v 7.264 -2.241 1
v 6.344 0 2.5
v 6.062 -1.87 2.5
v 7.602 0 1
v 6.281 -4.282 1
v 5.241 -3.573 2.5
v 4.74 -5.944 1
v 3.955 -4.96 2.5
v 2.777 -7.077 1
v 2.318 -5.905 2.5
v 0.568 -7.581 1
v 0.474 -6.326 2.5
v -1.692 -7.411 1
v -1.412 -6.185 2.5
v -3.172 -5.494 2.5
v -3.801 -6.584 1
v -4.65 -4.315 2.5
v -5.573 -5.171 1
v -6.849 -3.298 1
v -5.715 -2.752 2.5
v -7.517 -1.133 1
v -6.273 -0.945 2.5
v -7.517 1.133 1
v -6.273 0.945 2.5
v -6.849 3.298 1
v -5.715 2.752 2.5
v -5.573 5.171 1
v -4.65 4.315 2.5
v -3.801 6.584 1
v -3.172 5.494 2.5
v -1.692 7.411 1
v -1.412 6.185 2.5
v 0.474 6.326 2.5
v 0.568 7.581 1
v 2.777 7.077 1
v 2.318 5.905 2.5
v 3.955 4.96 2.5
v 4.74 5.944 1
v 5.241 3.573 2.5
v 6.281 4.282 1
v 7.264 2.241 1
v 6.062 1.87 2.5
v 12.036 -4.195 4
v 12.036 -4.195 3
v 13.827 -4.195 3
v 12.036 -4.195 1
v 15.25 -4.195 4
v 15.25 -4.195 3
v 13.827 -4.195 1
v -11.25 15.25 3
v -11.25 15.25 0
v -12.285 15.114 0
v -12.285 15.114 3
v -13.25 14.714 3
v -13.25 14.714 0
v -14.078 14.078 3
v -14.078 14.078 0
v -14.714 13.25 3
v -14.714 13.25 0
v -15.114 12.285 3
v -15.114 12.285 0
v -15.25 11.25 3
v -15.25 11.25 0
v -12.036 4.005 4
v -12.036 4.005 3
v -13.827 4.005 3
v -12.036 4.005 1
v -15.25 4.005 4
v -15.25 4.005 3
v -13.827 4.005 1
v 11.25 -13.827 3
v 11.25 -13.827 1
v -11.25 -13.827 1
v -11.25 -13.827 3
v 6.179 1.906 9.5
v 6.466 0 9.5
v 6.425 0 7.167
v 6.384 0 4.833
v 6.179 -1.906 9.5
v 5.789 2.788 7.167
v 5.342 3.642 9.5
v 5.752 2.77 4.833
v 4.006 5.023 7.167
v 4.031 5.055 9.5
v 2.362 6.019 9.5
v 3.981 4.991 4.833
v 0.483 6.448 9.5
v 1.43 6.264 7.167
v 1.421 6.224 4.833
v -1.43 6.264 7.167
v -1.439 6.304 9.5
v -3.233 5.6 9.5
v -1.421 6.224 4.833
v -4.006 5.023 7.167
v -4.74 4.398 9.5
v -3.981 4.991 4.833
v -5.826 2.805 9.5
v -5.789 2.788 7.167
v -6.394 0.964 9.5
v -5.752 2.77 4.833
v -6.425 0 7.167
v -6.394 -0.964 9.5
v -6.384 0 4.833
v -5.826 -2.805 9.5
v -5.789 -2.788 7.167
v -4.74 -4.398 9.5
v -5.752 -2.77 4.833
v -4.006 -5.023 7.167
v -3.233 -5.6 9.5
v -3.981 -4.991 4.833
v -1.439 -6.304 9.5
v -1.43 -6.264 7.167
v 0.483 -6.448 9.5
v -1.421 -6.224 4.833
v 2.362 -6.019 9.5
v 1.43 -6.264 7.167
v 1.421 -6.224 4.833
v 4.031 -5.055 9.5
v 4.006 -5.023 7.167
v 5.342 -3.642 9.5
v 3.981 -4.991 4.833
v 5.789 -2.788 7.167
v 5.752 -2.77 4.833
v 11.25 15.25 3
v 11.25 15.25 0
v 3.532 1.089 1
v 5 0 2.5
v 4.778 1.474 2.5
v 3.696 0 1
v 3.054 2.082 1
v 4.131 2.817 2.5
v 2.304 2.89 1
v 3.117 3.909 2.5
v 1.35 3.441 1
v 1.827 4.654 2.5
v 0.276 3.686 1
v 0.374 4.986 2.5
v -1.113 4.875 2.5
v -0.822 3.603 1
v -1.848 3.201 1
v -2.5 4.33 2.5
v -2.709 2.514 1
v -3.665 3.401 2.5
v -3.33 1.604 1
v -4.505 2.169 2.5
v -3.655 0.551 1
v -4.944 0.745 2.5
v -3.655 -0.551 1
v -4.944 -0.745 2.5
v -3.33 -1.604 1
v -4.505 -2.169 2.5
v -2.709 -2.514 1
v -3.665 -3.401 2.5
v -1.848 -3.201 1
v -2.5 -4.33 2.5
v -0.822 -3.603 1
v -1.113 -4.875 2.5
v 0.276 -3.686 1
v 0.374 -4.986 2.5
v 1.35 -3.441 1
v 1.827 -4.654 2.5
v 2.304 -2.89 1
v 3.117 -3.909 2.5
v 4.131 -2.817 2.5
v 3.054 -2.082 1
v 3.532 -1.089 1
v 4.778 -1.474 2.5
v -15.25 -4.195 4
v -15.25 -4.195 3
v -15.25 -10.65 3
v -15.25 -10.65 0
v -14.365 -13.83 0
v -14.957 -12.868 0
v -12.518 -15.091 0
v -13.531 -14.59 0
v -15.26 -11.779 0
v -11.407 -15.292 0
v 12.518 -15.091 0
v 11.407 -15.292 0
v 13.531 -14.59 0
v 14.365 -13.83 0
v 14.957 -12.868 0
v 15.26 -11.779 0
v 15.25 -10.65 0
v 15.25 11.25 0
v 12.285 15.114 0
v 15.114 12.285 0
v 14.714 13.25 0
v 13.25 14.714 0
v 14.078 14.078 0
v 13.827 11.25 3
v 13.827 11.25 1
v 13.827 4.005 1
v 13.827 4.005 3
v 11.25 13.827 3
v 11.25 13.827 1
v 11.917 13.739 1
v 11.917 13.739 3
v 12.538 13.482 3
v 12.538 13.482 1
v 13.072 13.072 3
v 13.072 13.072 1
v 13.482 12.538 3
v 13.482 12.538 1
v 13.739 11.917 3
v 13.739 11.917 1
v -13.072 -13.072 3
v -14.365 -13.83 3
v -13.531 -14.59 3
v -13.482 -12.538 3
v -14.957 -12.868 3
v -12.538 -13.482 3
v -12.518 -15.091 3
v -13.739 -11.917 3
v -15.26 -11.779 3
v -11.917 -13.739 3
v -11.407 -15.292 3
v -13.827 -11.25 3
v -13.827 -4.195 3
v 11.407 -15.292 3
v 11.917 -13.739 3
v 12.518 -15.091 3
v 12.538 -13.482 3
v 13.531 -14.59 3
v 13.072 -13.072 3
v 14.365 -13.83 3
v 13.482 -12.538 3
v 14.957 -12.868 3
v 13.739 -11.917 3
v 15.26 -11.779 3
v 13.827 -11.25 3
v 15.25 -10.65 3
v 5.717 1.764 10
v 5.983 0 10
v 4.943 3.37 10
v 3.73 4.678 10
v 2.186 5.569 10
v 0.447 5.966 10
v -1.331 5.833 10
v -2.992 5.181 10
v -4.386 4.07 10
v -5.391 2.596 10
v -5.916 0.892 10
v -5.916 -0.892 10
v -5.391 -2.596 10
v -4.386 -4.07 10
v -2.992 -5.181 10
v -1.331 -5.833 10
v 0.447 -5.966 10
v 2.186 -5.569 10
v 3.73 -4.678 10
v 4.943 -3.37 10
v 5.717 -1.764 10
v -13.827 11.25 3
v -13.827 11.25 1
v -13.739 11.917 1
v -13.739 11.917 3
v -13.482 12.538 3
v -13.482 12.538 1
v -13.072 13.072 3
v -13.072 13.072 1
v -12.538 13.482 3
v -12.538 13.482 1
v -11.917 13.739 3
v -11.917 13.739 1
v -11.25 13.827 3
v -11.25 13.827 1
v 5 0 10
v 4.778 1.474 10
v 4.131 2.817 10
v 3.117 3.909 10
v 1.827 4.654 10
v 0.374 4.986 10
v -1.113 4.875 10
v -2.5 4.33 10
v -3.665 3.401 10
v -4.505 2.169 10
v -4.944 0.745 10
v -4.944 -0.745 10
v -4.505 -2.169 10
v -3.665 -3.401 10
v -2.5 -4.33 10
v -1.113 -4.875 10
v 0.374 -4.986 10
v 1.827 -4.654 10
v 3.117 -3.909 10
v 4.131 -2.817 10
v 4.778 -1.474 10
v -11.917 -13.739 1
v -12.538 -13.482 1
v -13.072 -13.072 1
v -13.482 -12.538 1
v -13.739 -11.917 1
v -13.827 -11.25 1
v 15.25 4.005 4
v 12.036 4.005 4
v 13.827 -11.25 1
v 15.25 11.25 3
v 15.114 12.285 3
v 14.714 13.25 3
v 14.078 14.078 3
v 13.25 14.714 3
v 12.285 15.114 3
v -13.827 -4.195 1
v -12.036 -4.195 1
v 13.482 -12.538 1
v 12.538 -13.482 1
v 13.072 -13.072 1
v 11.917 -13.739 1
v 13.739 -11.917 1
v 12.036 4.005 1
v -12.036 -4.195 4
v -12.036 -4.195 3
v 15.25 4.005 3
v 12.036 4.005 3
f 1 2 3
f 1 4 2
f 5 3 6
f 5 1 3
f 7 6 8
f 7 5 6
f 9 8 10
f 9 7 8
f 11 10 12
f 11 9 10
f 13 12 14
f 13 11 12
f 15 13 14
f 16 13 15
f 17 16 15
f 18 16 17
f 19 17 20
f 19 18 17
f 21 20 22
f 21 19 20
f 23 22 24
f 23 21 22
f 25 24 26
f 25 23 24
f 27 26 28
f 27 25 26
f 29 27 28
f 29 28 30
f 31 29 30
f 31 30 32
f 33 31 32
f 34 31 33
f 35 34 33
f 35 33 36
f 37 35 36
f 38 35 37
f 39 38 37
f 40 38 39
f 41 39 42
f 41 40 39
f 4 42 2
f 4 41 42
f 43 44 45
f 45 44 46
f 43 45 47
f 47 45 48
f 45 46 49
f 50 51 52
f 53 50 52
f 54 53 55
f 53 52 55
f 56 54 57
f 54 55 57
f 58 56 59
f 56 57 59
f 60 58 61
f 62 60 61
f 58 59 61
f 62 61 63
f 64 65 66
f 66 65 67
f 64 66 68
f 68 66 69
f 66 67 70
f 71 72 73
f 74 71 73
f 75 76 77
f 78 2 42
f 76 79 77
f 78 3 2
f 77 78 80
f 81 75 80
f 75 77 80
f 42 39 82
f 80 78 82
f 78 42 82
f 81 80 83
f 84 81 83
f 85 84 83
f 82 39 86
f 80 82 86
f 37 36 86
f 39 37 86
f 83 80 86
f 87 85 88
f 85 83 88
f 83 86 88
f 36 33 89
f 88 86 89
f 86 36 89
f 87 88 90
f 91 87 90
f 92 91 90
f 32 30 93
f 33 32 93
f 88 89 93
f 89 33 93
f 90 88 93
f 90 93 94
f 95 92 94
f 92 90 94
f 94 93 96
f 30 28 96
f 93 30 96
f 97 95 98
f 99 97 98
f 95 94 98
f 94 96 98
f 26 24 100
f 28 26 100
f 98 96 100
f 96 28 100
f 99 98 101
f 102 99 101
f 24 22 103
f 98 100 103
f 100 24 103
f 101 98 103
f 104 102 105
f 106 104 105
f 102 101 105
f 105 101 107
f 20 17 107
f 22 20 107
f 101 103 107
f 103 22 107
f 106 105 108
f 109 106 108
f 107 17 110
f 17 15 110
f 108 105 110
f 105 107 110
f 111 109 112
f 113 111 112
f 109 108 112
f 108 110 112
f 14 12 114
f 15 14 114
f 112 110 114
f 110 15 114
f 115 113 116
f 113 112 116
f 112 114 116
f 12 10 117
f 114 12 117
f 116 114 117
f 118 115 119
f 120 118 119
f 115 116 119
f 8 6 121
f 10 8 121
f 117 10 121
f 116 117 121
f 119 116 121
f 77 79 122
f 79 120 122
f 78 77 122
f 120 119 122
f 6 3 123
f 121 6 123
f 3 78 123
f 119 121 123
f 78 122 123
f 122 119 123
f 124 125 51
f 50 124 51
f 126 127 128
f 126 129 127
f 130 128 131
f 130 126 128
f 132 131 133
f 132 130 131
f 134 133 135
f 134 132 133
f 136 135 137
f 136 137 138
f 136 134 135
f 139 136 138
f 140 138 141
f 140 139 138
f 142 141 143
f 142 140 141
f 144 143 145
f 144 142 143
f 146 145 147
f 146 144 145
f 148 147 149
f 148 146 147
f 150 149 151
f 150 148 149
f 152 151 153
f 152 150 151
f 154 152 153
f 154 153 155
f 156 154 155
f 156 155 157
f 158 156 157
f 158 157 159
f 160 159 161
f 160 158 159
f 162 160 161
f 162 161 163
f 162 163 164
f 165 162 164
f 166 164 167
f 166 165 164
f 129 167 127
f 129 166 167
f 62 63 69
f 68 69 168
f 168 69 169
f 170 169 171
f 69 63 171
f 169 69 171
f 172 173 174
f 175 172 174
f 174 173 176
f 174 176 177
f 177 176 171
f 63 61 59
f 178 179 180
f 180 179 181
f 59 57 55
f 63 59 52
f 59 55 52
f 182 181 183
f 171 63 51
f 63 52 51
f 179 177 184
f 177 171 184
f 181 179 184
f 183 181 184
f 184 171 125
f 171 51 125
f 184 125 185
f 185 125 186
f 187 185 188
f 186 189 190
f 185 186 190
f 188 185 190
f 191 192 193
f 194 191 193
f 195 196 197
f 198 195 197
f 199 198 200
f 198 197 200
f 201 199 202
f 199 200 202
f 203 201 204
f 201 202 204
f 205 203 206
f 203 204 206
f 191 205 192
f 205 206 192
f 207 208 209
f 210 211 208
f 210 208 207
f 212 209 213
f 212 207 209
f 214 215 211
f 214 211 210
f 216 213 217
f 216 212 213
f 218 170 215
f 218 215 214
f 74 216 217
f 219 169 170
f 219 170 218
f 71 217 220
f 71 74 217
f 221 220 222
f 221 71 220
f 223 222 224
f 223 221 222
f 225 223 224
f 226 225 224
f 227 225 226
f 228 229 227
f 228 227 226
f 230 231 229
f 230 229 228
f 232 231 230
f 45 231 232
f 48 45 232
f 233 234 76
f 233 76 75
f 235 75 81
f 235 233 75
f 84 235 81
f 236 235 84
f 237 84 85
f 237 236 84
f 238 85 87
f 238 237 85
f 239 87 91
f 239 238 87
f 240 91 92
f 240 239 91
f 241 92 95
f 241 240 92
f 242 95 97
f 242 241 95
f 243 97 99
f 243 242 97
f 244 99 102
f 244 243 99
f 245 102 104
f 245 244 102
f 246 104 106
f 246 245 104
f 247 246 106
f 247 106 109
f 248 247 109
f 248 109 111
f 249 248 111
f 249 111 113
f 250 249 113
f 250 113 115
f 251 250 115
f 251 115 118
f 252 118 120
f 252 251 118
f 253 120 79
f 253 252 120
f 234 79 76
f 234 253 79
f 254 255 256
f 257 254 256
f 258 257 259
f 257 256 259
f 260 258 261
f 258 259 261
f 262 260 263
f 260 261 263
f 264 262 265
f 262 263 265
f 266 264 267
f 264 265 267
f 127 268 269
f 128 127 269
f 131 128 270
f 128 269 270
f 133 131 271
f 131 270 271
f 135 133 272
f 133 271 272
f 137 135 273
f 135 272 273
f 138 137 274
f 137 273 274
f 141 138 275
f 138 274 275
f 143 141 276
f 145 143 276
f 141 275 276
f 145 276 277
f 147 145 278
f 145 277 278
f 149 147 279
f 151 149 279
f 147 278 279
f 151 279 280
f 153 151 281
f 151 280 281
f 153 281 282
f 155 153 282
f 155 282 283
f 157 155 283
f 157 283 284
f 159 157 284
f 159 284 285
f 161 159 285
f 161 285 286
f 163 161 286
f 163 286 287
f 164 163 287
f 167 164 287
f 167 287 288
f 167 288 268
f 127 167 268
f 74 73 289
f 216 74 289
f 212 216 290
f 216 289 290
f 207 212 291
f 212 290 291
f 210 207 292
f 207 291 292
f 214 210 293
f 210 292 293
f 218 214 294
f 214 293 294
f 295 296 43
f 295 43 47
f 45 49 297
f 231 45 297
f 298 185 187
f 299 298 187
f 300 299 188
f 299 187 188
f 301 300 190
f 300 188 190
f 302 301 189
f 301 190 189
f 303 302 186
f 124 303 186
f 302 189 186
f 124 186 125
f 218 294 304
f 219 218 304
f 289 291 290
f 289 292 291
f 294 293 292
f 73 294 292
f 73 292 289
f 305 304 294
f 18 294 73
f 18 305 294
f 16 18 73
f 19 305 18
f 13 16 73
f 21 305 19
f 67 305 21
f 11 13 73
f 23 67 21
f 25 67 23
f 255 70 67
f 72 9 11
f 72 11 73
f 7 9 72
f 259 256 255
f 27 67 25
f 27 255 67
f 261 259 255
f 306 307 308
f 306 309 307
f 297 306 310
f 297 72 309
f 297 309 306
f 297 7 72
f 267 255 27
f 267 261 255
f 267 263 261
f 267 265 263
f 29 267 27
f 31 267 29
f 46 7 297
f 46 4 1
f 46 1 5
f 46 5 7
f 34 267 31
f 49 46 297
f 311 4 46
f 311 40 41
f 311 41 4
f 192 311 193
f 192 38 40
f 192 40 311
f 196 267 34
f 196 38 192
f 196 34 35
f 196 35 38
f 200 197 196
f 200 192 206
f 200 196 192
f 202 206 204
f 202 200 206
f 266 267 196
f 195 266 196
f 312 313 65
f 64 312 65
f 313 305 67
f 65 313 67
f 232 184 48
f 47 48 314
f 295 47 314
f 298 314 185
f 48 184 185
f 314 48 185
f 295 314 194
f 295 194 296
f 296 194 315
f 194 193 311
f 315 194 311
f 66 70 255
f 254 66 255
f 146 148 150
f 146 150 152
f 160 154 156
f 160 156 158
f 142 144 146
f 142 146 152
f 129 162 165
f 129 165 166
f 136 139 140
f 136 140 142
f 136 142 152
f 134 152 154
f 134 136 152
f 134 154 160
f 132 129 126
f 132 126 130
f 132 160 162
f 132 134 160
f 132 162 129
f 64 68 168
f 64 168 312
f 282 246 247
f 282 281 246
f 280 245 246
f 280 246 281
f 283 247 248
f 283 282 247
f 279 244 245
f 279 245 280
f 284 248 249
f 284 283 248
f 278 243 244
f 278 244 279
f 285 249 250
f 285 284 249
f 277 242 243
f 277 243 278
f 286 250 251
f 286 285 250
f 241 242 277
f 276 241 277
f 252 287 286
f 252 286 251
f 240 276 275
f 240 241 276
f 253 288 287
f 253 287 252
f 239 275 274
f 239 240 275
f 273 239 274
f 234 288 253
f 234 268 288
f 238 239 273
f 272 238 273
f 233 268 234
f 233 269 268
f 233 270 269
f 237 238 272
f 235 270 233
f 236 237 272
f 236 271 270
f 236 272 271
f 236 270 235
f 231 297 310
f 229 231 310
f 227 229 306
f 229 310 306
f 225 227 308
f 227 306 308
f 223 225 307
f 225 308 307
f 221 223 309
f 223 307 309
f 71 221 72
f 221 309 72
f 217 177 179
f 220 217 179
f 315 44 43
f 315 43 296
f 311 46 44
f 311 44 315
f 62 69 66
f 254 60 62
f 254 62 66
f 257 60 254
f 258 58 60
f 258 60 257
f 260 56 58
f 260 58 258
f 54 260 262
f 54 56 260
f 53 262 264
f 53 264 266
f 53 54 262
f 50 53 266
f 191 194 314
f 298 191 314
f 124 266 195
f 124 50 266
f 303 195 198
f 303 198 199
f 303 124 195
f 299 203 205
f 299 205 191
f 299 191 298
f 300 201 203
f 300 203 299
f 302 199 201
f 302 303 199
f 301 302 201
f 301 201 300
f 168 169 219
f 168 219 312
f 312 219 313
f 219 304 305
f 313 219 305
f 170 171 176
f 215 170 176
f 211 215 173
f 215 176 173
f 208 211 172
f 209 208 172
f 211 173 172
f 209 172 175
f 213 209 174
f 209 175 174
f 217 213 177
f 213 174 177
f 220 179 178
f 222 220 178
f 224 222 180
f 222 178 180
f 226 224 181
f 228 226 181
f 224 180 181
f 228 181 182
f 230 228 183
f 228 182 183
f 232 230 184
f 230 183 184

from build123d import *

# Parameters (mm, degrees)
EXTRUDE_1_DEPTH     = 1
EXTRUDE_2_DEPTH     = 3
SKETCH_1_4_R        = 6.3
EXTRUDE_3_DEPTH     = 10
EXTRUDE_3_DRAFT     = -1
SKETCH_1_5_W        = 1.42302488
SKETCH_1_5_H        = 8.2
SKETCH_1_5_W_2      = 1.791144373
EXTRUDE_4_DEPTH     = 4
CHAMFER_1_SIZE      = 0.5
CHAMFER_1_SIZE2     = 0.491497051
SKETCH_2_R          = 5
CUT_EXTRUDE_1_DEPTH = 9
CHAMFER_2_SIZE      = 1.5
CHAMFER_2_SIZE_2    = 1.284636358
CHAMFER_2_SIZE_3    = 1.303930107


# Read off the part's stored shape, not the designer's step: Бобышка-Вытянуть1
with BuildPart() as part:
    # Бобышка-Вытянуть1 outline → Бобышка-Вытянуть1 (new body)
    with BuildSketch(Plane.XY):
        with BuildLine():
            Line((-15.25, 11.25), (-15.25, -10.65))
            ThreePointArc((-15.25, -10.65), (-14.365417418, -13.829568629), (-11.406655615, -15.291714861))
            Line((-11.406655615, -15.291714861), (11.406655615, -15.291714861))
            ThreePointArc((11.406655615, -15.291714861), (14.365417418, -13.829568629), (15.25, -10.65))
            Line((15.25, -10.65), (15.25, 11.25))
            ThreePointArc((15.25, 11.25), (14.078427125, 14.078427125), (11.25, 15.25))
            Line((11.25, 15.25), (-11.25, 15.25))
            ThreePointArc((-11.25, 15.25), (-14.078427125, 14.078427125), (-15.25, 11.25))
        make_face()
    extrude(amount=EXTRUDE_1_DEPTH)

    # Эскиз1<3> → Бобышка-Вытянуть2 (add)
    with BuildSketch(Plane.XY):
        with BuildLine():
            ThreePointArc((-11.25, 15.25), (-14.078427125, 14.078427125), (-15.25, 11.25))
            Line((-15.25, 11.25), (-15.25, -10.65))
            ThreePointArc((-15.25, -10.65), (-14.365417418, -13.829568629), (-11.406655615, -15.291714861))
            Line((-11.406655615, -15.291714861), (11.406655615, -15.291714861))
            ThreePointArc((11.406655615, -15.291714861), (14.365417418, -13.829568629), (15.25, -10.65))
            Line((15.25, -10.65), (15.25, 11.25))
            ThreePointArc((15.25, 11.25), (14.078427125, 14.078427125), (11.25, 15.25))
            Line((11.25, 15.25), (-11.25, 15.25))
        make_face()
        with BuildLine():
            ThreePointArc((13.82697512, -11.25), (13.072196582, -13.072196582), (11.25, -13.82697512))
            Line((11.25, -13.82697512), (-11.25, -13.82697512))
            ThreePointArc((-11.25, -13.82697512), (-13.072196582, -13.072196582), (-13.82697512, -11.25))
            Line((-13.82697512, -11.25), (-13.82697512, -4.195156857))
            Line((-13.82697512, -4.195156857), (-12.035830747, -4.195156857))
            Line((-12.035830747, -4.195156857), (-12.035830747, 4.004843143))
            Line((-12.035830747, 4.004843143), (-13.82697512, 4.004843143))
            Line((-13.82697512, 4.004843143), (-13.82697512, 11.25))
            ThreePointArc((-13.82697512, 11.25), (-13.072196582, 13.072196582), (-11.25, 13.82697512))
            Line((-11.25, 13.82697512), (11.25, 13.82697512))
            ThreePointArc((11.25, 13.82697512), (13.072196582, 13.072196582), (13.82697512, 11.25))
            Line((13.82697512, 11.25), (13.82697512, 4.004843143))
            Line((13.82697512, 4.004843143), (12.035830747, 4.004843143))
            Line((12.035830747, 4.004843143), (12.035830747, -4.195156857))
            Line((12.035830747, -4.195156857), (13.82697512, -4.195156857))
            Line((13.82697512, -4.195156857), (13.82697512, -11.25))
        make_face(mode=Mode.SUBTRACT)
    extrude(amount=EXTRUDE_2_DEPTH)


with BuildPart() as extrude_3_tool:
    # Эскиз1<4> → Бобышка-Вытянуть3 (with draft: the straight prism first)
    with BuildSketch(Plane.XY):
        Circle(SKETCH_1_4_R)
    extrude(amount=EXTRUDE_3_DEPTH)
    # Бобышка-Вытянуть3: the draft: its side faces are tilted about the plane it starts from
    extrude_3_sides = [extrude_3_tool.faces().sort_by_distance(p)[0] for p in [
        (-6.3, 0, 5),
    ]]
    draft(extrude_3_sides, Plane.XY, EXTRUDE_3_DRAFT)


with BuildPart() as part_1:
    add(part.part)

    # Бобышка-Вытянуть3: add extrude_3_tool
    add(extrude_3_tool.part)

    # Эскиз1<5> → Бобышка-Вытянуть4 (add)
    with BuildSketch(Plane.XY):
        with Locations((-14.53848756, -0.095156857)):
            Rectangle(SKETCH_1_5_W, SKETCH_1_5_H)
        with Locations((-12.931402933, -0.095156857)):
            Rectangle(SKETCH_1_5_W_2, SKETCH_1_5_H)
        with Locations((12.931402933, -0.095156857)):
            Rectangle(SKETCH_1_5_W_2, SKETCH_1_5_H)
        with Locations((14.53848756, -0.095156857)):
            Rectangle(SKETCH_1_5_W, SKETCH_1_5_H)
    extrude(amount=EXTRUDE_4_DEPTH)

    # Фаска1
    chamfer_1_edges = [part_1.edges().sort_by_distance(p)[0] for p in [
        (-6.474550649, 0, 10),
    ]]
    chamfer_1_side = [part_1.faces().sort_by_distance(p)[0] for p in [
        (-6.396002857, 0, 5.5),
    ]]
    chamfer(chamfer_1_edges, length=CHAMFER_1_SIZE, length2=CHAMFER_1_SIZE2, reference=chamfer_1_side[0])

    # Эскиз2 → Вырез-Вытянуть1 (cut)
    with BuildSketch(Plane.XY.offset(10)):
        Circle(SKETCH_2_R)
    extrude(amount=-CUT_EXTRUDE_1_DEPTH, mode=Mode.SUBTRACT)

    # Фаска2
    # the kernel refuses this chamfer: 1.5, 1.303930107, 1.284636358 mm, written as the material it adds along each edge
    with BuildSketch(Plane(origin=(0, 0, 1), x_dir=(1, 0, 0), z_dir=(0, 1, 0))) as chamfer_2_piece_1:
        Polygon((6.317455065 + CHAMFER_2_SIZE * 0.0174524064373, -CHAMFER_2_SIZE * 0.999847695156), (6.317455065 + CHAMFER_2_SIZE_2, 0), (6.317455065, 0), align=None)
    revolve(axis=Axis((0, 0, 1), (0, 0, -1)))
    with BuildSketch(Plane(origin=(0, 0, 1), x_dir=(1, 0, 0), z_dir=(0, -1, 0))) as chamfer_2_piece_2:
        Polygon((5, CHAMFER_2_SIZE), (5 - CHAMFER_2_SIZE_3, 0), (5, 0), align=None)
    revolve(axis=Axis((0, 0, 1), (0, 0, 1)))


solid = part_1.part
